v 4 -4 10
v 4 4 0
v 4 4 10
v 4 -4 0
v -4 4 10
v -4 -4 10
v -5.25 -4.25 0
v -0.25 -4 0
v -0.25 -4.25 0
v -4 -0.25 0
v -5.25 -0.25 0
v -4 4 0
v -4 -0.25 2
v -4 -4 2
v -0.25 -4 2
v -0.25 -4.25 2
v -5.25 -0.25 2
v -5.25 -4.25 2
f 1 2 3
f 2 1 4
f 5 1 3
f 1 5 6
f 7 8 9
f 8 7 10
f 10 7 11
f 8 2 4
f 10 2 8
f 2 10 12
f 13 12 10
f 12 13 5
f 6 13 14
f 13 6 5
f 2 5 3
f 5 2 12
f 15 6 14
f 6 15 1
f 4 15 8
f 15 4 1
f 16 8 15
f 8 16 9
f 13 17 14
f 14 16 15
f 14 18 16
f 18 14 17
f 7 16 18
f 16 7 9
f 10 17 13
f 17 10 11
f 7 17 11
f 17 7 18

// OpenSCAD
translate([0, 0, 5]) color([0,1,0,0.9]) cube([8, 8, 10], center=true);
translate([-0.5, -0.5, 1]) color([1,0,0]) cube([0.5, 0.5, 2], center=true);
translate([-0.5, -1.0, 1]) color([1,0,0]) cube([0.5, 0.5, 2], center=true);
translate([-0.5, -1.5, 1]) color([1,0,0]) cube([0.5, 0.5, 2], center=true);
translate([-0.5, -2.0, 1]) color([1,0,0]) cube([0.5, 0.5, 2], center=true);
translate([-0.5, -2.5, 1]) color([1,0,0]) cube([0.5, 0.5, 2], center=true);
translate([-0.5, -3.0, 1]) color([1,0,0]) cube([0.5, 0.5, 2], center=true);
translate([-0.5, -3.5, 1]) color([1,0,0]) cube([0.5, 0.5, 2], center=true);
translate([-0.5, -4.0, 1]) color([1,0,0]) cube([0.5, 0.5, 2], center=true);
translate([-1.0, -0.5, 1]) color([1,0,0]) cube([0.5, 0.5, 2], center=true);
translate([-1.0, -1.0, 1]) color([1,0,0]) cube([0.5, 0.5, 2], center=true);
translate([-1.0, -1.5, 1]) color([1,0,0]) cube([0.5, 0.5, 2], center=true);
translate([-1.0, -2.0, 1]) color([1,0,0]) cube([0.5, 0.5, 2], center=true);
translate([-1.0, -2.5, 1]) color([1,0,0]) cube([0.5, 0.5, 2], center=true);
translate([-1.0, -3.0, 1]) color([1,0,0]) cube([0.5, 0.5, 2], center=true);
translate([-1.0, -3.5, 1]) color([1,0,0]) cube([0.5, 0.5, 2], center=true);
translate([-1.0, -4.0, 1]) color([1,0,0]) cube([0.5, 0.5, 2], center=true);
translate([-1.5, -0.5, 1]) color([1,0,0]) cube([0.5, 0.5, 2], center=true);
translate([-1.5, -1.0, 1]) color([1,0,0]) cube([0.5, 0.5, 2], center=true);
translate([-1.5, -1.5, 1]) color([1,0,0]) cube([0.5, 0.5, 2], center=true);
translate([-1.5, -2.0, 1]) color([1,0,0]) cube([0.5, 0.5, 2], center=true);
translate([-1.5, -2.5, 1]) color([1,0,0]) cube([0.5, 0.5, 2], center=true);
translate([-1.5, -3.0, 1]) color([1,0,0]) cube([0.5, 0.5, 2], center=true);
translate([-1.5, -3.5, 1]) color([1,0,0]) cube([0.5, 0.5, 2], center=true);
translate([-1.5, -4.0, 1]) color([1,0,0]) cube([0.5, 0.5, 2], center=true);
translate([-2.0, -0.5, 1]) color([1,0,0]) cube([0.5, 0.5, 2], center=true);
translate([-2.0, -1.0, 1]) color([1,0,0]) cube([0.5, 0.5, 2], center=true);
translate([-2.0, -1.5, 1]) color([1,0,0]) cube([0.5, 0.5, 2], center=true);
translate([-2.0, -2.0, 1]) color([1,0,0]) cube([0.5, 0.5, 2], center=true);
translate([-2.0, -2.5, 1]) color([1,0,0]) cube([0.5, 0.5, 2], center=true);
translate([-2.0, -3.0, 1]) color([1,0,0]) cube([0.5, 0.5, 2], center=true);
translate([-2.0, -3.5, 1]) color([1,0,0]) cube([0.5, 0.5, 2], center=true);
translate([-2.0, -4.0, 1]) color([1,0,0]) cube([0.5, 0.5, 2], center=true);
translate([-2.5, -0.5, 1]) color([1,0,0]) cube([0.5, 0.5, 2], center=true);
translate([-2.5, -1.0, 1]) color([1,0,0]) cube([0.5, 0.5, 2], center=true);
translate([-2.5, -1.5, 1]) color([1,0,0]) cube([0.5, 0.5, 2], center=true);
translate([-2.5, -2.0, 1]) color([1,0,0]) cube([0.5, 0.5, 2], center=true);
translate([-2.5, -2.5, 1]) color([1,0,0]) cube([0.5, 0.5, 2], center=true);
translate([-2.5, -3.0, 1]) color([1,0,0]) cube([0.5, 0.5, 2], center=true);
translate([-2.5, -3.5, 1]) color([1,0,0]) cube([0.5, 0.5, 2], center=true);
translate([-2.5, -4.0, 1]) color([1,0,0]) cube([0.5, 0.5, 2], center=true);
translate([-3.0, -0.5, 1]) color([1,0,0]) cube([0.5, 0.5, 2], center=true);
translate([-3.0, -1.0, 1]) color([1,0,0]) cube([0.5, 0.5, 2], center=true);
translate([-3.0, -1.5, 1]) color([1,0,0]) cube([0.5, 0.5, 2], center=true);
translate([-3.0, -2.0, 1]) color([1,0,0]) cube([0.5, 0.5, 2], center=true);
translate([-3.0, -2.5, 1]) color([1,0,0]) cube([0.5, 0.5, 2], center=true);
translate([-3.0, -3.0, 1]) color([1,0,0]) cube([0.5, 0.5, 2], center=true);
translate([-3.0, -3.5, 1]) color([1,0,0]) cube([0.5, 0.5, 2], center=true);
translate([-3.0, -4.0, 1]) color([1,0,0]) cube([0.5, 0.5, 2], center=true);
translate([-3.5, -0.5, 1]) color([1,0,0]) cube([0.5, 0.5, 2], center=true);
translate([-3.5, -1.0, 1]) color([1,0,0]) cube([0.5, 0.5, 2], center=true);
translate([-3.5, -1.5, 1]) color([1,0,0]) cube([0.5, 0.5, 2], center=true);
translate([-3.5, -2.0, 1]) color([1,0,0]) cube([0.5, 0.5, 2], center=true);
translate([-3.5, -2.5, 1]) color([1,0,0]) cube([0.5, 0.5, 2], center=true);
translate([-3.5, -3.0, 1]) color([1,0,0]) cube([0.5, 0.5, 2], center=true);
translate([-3.5, -3.5, 1]) color([1,0,0]) cube([0.5, 0.5, 2], center=true);
translate([-3.5, -4.0, 1]) color([1,0,0]) cube([0.5, 0.5, 2], center=true);
translate([-4.0, -0.5, 1]) color([1,0,0]) cube([0.5, 0.5, 2], center=true);
translate([-4.0, -1.0, 1]) color([1,0,0]) cube([0.5, 0.5, 2], center=true);
translate([-4.0, -1.5, 1]) color([1,0,0]) cube([0.5, 0.5, 2], center=true);
translate([-4.0, -2.0, 1]) color([1,0,0]) cube([0.5, 0.5, 2], center=true);
translate([-4.0, -2.5, 1]) color([1,0,0]) cube([0.5, 0.5, 2], center=true);
translate([-4.0, -3.0, 1]) color([1,0,0]) cube([0.5, 0.5, 2], center=true);
translate([-4.0, -3.5, 1]) color([1,0,0]) cube([0.5, 0.5, 2], center=true);
translate([-4.0, -4.0, 1]) color([1,0,0]) cube([0.5, 0.5, 2], center=true);
translate([-4.5, -0.5, 1]) color([1,0,0]) cube([0.5, 0.5, 2], center=true);
translate([-4.5, -1.0, 1]) color([1,0,0]) cube([0.5, 0.5, 2], center=true);
translate([-4.5, -1.5, 1]) color([1,0,0]) cube([0.5, 0.5, 2], center=true);
translate([-4.5, -2.0, 1]) color([1,0,0]) cube([0.5, 0.5, 2], center=true);
translate([-4.5, -2.5, 1]) color([1,0,0]) cube([0.5, 0.5, 2], center=true);
translate([-4.5, -3.0, 1]) color([1,0,0]) cube([0.5, 0.5, 2], center=true);
translate([-4.5, -3.5, 1]) color([1,0,0]) cube([0.5, 0.5, 2], center=true);
translate([-4.5, -4.0, 1]) color([1,0,0]) cube([0.5, 0.5, 2], center=true);
translate([-5.0, -0.5, 1]) color([1,0,0]) cube([0.5, 0.5, 2], center=true);
translate([-5.0, -1.0, 1]) color([1,0,0]) cube([0.5, 0.5, 2], center=true);
translate([-5.0, -1.5, 1]) color([1,0,0]) cube([0.5, 0.5, 2], center=true);
translate([-5.0, -2.0, 1]) color([1,0,0]) cube([0.5, 0.5, 2], center=true);
translate([-5.0, -2.5, 1]) color([1,0,0]) cube([0.5, 0.5, 2], center=true);
translate([-5.0, -3.0, 1]) color([1,0,0]) cube([0.5, 0.5, 2], center=true);
translate([-5.0, -3.5, 1]) color([1,0,0]) cube([0.5, 0.5, 2], center=true);
translate([-5.0, -4.0, 1]) color([1,0,0]) cube([0.5, 0.5, 2], center=true);
